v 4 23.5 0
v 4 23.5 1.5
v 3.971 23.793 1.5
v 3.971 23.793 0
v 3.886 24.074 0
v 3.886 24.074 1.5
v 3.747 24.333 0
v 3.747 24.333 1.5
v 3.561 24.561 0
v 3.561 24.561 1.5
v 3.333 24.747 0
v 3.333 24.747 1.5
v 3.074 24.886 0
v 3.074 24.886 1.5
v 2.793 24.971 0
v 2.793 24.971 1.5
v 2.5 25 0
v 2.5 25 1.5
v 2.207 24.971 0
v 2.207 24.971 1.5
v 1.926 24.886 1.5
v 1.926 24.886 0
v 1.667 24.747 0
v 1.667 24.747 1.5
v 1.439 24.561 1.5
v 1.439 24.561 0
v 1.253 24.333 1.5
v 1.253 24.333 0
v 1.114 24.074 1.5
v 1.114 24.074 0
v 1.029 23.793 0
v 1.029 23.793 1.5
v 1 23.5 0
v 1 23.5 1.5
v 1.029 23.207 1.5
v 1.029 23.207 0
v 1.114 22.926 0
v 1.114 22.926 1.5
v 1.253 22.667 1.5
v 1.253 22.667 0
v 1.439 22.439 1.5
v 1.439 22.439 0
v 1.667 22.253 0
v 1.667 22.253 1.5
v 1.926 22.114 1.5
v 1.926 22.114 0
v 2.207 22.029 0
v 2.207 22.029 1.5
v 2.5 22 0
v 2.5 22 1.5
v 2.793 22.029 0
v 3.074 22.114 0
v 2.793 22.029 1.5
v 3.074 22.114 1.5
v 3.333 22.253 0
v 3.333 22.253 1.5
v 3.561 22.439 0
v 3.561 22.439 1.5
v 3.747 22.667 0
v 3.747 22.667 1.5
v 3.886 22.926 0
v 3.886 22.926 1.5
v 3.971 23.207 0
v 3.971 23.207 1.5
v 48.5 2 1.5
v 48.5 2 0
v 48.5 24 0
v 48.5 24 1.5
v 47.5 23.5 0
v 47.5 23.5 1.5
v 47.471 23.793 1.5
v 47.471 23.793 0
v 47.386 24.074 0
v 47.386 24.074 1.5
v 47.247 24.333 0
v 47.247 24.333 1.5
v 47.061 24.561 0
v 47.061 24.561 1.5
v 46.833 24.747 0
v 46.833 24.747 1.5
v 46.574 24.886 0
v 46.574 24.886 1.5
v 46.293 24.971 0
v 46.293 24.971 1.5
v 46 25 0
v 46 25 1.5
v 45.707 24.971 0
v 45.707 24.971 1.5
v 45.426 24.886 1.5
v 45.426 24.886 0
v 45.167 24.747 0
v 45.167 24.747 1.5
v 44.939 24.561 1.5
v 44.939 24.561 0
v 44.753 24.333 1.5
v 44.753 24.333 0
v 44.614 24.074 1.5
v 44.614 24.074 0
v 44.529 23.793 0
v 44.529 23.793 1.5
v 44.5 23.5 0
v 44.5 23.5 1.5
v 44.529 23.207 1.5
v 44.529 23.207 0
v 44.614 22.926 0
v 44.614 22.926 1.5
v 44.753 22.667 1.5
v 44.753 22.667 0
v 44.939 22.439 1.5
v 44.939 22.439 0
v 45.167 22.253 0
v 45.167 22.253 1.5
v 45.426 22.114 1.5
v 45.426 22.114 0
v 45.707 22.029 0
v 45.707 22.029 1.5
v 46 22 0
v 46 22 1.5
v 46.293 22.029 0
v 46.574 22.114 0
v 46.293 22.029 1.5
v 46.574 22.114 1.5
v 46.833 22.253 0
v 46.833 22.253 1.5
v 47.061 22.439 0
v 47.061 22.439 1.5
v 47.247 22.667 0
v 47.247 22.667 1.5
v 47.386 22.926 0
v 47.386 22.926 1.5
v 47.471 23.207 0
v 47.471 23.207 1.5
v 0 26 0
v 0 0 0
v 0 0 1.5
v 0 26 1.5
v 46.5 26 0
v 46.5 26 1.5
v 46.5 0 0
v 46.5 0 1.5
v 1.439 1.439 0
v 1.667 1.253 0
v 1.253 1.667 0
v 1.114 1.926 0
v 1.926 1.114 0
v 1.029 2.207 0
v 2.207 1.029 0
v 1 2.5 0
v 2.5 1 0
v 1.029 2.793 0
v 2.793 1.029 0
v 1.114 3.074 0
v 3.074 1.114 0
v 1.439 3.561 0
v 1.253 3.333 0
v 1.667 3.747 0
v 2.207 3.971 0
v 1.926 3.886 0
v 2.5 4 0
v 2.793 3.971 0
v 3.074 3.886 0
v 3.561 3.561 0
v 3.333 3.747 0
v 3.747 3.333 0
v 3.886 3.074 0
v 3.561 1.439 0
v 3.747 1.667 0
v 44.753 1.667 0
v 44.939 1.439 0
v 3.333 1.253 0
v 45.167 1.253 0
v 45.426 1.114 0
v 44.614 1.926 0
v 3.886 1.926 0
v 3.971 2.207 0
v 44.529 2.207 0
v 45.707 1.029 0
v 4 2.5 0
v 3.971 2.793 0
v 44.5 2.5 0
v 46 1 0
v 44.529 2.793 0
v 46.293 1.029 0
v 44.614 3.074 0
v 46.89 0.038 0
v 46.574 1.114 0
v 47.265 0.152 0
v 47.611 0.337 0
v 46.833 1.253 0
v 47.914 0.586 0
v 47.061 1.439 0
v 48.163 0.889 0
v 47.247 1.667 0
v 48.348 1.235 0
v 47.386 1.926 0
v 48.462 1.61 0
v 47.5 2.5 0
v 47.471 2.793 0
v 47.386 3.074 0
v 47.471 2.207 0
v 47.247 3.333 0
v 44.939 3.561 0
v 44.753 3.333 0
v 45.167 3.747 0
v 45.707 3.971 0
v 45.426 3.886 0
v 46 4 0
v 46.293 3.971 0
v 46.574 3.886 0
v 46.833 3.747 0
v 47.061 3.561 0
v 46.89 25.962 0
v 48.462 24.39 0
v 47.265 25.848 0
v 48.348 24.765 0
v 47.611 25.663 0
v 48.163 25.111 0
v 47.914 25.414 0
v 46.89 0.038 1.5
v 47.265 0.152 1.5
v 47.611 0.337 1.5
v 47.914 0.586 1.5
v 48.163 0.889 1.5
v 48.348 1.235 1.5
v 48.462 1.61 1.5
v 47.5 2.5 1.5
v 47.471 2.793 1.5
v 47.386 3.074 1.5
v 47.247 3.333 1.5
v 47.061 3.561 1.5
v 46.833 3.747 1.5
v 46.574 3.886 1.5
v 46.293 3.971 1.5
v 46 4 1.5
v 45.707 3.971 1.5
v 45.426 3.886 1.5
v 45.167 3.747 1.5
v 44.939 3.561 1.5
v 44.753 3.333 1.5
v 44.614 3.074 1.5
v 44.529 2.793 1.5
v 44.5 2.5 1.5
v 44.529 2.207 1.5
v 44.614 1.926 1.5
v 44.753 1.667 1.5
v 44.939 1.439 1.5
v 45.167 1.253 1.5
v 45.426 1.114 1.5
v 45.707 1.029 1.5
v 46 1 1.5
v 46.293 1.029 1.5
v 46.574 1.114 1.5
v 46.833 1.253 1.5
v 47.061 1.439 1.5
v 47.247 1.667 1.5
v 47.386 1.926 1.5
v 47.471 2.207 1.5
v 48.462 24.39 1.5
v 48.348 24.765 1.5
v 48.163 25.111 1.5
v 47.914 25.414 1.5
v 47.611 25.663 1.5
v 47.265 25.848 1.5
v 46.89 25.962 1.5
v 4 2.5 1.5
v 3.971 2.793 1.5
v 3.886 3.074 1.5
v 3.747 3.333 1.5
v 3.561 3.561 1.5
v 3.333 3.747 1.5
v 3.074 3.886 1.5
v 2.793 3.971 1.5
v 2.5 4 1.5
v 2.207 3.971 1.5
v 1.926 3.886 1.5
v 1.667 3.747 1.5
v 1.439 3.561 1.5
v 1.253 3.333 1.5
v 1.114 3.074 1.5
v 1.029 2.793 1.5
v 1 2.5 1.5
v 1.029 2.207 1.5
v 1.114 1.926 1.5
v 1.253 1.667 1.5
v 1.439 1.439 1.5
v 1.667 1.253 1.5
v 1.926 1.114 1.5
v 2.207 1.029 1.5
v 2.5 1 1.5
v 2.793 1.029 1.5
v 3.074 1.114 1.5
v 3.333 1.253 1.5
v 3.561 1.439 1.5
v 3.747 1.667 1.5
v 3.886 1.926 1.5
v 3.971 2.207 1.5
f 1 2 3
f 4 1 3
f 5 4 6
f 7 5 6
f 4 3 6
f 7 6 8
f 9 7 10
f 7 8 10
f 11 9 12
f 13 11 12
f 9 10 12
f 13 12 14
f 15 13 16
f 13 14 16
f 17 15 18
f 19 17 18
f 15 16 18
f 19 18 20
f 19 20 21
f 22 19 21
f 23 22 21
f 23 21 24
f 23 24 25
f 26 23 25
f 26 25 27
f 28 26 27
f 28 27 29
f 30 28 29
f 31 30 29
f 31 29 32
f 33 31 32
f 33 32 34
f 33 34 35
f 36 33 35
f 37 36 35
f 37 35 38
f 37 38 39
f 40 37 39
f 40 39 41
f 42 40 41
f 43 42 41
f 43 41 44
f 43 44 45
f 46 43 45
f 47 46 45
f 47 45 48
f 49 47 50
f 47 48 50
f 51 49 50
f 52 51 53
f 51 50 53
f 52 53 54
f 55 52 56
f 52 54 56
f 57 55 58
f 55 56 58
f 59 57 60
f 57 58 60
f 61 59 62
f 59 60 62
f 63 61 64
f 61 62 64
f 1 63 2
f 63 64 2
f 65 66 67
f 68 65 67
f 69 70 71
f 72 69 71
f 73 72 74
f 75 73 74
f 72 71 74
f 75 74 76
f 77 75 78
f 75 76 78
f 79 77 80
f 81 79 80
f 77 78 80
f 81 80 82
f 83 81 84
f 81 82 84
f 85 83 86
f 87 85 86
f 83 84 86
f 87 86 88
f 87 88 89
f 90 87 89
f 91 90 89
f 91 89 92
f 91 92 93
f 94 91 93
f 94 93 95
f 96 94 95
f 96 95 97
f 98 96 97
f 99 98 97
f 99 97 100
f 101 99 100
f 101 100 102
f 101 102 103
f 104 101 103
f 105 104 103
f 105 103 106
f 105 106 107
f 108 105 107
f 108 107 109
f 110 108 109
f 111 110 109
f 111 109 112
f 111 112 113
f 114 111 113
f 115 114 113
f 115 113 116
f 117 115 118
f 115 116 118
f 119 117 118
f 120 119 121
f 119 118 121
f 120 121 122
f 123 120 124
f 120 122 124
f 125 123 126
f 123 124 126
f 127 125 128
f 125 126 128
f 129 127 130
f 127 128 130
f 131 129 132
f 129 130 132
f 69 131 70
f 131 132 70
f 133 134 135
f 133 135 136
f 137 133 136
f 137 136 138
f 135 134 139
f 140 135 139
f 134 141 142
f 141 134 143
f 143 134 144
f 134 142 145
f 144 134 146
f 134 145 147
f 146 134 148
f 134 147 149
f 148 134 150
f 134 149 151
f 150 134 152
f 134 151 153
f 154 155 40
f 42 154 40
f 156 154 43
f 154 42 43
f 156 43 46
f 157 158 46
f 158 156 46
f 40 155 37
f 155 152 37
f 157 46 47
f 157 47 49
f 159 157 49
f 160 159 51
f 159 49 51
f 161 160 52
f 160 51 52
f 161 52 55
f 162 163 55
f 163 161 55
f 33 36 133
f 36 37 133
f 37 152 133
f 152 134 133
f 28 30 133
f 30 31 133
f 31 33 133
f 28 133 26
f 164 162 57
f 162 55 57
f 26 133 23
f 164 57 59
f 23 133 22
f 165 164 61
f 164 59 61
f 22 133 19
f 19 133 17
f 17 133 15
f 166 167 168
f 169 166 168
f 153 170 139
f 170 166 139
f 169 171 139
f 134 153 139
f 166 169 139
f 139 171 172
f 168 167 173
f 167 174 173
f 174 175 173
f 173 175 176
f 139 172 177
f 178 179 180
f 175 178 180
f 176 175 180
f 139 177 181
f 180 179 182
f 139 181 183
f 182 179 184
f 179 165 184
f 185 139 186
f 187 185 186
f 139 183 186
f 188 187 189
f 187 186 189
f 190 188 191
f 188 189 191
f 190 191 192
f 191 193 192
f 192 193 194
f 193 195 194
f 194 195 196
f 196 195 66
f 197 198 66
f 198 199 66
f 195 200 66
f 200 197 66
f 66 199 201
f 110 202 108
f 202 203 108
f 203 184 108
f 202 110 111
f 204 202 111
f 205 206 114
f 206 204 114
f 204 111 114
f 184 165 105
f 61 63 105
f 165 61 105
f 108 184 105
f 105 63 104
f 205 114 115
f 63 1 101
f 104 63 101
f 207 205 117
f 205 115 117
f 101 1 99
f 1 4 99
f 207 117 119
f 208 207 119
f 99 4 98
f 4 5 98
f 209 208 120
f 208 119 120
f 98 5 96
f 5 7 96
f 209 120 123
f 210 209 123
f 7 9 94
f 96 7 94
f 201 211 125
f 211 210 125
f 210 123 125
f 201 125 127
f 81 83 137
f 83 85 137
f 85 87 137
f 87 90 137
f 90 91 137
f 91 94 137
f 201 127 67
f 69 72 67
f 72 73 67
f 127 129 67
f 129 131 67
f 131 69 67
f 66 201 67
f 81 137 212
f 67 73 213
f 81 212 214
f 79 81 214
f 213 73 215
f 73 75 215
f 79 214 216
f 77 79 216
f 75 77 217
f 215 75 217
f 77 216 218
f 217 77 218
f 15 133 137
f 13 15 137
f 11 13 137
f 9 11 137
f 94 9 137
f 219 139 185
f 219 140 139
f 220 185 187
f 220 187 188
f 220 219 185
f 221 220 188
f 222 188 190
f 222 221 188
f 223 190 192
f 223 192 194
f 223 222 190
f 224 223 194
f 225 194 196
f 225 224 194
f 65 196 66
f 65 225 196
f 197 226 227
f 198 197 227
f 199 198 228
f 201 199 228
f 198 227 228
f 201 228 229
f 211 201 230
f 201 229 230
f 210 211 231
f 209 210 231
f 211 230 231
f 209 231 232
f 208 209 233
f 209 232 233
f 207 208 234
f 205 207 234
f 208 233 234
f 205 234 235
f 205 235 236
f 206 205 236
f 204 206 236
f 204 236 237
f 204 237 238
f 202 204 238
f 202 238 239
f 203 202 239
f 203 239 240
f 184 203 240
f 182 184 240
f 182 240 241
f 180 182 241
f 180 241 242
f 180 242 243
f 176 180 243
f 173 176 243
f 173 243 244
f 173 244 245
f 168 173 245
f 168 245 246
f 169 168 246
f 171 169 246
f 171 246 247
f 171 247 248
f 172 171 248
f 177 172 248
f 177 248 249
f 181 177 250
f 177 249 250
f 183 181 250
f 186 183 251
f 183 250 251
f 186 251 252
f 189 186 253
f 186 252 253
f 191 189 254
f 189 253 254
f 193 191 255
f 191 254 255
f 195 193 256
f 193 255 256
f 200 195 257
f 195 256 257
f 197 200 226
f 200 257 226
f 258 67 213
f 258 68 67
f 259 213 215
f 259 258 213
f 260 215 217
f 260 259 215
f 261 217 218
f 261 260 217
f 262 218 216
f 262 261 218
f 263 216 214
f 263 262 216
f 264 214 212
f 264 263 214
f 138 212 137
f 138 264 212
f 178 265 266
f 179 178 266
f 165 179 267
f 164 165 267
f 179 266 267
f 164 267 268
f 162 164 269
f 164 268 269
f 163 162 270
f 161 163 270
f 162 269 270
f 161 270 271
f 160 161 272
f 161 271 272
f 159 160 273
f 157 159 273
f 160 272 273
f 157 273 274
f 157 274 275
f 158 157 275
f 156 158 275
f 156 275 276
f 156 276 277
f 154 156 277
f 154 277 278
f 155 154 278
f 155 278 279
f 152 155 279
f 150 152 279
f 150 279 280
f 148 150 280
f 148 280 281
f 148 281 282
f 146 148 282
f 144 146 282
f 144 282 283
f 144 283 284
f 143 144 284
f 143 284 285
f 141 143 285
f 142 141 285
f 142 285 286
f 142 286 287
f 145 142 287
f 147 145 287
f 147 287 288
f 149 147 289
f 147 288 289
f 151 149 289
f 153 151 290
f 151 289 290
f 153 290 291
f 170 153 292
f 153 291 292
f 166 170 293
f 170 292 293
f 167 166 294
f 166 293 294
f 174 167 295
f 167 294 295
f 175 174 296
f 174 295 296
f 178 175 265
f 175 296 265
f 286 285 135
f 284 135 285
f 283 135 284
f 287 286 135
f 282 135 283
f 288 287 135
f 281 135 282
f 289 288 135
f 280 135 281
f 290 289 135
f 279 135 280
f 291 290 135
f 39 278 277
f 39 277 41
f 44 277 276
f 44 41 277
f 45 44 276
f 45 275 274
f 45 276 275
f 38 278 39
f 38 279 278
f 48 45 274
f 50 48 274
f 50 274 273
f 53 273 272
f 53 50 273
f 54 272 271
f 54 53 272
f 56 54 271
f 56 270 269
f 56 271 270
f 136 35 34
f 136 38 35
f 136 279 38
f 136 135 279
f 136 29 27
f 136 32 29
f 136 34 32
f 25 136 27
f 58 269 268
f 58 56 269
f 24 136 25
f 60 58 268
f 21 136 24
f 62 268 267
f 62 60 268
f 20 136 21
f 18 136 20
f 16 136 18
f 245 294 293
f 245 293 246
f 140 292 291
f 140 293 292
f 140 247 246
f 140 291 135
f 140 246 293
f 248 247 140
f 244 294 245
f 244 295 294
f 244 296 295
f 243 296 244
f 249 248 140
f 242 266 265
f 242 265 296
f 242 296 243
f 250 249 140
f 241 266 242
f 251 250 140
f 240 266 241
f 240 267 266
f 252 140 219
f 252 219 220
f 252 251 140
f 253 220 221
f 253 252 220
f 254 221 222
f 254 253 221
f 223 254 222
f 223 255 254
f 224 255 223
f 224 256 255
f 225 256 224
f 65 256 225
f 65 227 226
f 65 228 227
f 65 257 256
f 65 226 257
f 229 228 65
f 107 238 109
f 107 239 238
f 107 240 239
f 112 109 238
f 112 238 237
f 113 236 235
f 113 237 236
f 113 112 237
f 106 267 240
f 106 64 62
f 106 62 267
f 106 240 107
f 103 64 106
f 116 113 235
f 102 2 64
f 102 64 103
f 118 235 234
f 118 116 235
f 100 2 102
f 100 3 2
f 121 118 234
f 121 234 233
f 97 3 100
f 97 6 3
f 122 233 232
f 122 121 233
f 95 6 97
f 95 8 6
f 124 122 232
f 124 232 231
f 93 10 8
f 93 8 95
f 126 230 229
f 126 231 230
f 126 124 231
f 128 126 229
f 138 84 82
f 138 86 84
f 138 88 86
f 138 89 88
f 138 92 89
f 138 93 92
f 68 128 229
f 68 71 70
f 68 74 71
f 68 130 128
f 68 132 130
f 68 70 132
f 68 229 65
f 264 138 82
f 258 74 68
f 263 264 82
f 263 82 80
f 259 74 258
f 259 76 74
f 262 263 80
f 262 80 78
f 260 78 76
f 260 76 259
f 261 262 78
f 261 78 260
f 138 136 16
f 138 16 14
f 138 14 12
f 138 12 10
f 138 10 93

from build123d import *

# Parameters (mm, degrees)
BOX_W        = 48.5
BOX_H        = 26
BOX_DEPTH    = 1.5
FILLET_R     = 2
SKETCH_R     = 1.5
POCKET_DEPTH = 5


with BuildPart() as part:
    # Box → Box (new body)
    with BuildSketch(Plane.XY):
        with Locations((24.25, 13)):
            Rectangle(BOX_W, BOX_H)
    extrude(amount=BOX_DEPTH)

    # Fillet
    fillet_edges = [part.edges().sort_by_distance(p)[0] for p in [
        (48.5, 0, 0.75),
        (48.5, 26, 0.75),
    ]]
    fillet(fillet_edges, radius=FILLET_R)

    # Sketch → Pocket (cut)
    with BuildSketch(Plane.XY.offset(1.5)):
        with Locations((2.5, 23.5)):
            Circle(SKETCH_R)
        with Locations((46, 23.5)):
            Circle(SKETCH_R)
        with Locations((46, 2.5)):
            Circle(SKETCH_R)
        with Locations((2.5, 2.5)):
            Circle(SKETCH_R)
    extrude(amount=-POCKET_DEPTH, mode=Mode.SUBTRACT)


solid = part.part
